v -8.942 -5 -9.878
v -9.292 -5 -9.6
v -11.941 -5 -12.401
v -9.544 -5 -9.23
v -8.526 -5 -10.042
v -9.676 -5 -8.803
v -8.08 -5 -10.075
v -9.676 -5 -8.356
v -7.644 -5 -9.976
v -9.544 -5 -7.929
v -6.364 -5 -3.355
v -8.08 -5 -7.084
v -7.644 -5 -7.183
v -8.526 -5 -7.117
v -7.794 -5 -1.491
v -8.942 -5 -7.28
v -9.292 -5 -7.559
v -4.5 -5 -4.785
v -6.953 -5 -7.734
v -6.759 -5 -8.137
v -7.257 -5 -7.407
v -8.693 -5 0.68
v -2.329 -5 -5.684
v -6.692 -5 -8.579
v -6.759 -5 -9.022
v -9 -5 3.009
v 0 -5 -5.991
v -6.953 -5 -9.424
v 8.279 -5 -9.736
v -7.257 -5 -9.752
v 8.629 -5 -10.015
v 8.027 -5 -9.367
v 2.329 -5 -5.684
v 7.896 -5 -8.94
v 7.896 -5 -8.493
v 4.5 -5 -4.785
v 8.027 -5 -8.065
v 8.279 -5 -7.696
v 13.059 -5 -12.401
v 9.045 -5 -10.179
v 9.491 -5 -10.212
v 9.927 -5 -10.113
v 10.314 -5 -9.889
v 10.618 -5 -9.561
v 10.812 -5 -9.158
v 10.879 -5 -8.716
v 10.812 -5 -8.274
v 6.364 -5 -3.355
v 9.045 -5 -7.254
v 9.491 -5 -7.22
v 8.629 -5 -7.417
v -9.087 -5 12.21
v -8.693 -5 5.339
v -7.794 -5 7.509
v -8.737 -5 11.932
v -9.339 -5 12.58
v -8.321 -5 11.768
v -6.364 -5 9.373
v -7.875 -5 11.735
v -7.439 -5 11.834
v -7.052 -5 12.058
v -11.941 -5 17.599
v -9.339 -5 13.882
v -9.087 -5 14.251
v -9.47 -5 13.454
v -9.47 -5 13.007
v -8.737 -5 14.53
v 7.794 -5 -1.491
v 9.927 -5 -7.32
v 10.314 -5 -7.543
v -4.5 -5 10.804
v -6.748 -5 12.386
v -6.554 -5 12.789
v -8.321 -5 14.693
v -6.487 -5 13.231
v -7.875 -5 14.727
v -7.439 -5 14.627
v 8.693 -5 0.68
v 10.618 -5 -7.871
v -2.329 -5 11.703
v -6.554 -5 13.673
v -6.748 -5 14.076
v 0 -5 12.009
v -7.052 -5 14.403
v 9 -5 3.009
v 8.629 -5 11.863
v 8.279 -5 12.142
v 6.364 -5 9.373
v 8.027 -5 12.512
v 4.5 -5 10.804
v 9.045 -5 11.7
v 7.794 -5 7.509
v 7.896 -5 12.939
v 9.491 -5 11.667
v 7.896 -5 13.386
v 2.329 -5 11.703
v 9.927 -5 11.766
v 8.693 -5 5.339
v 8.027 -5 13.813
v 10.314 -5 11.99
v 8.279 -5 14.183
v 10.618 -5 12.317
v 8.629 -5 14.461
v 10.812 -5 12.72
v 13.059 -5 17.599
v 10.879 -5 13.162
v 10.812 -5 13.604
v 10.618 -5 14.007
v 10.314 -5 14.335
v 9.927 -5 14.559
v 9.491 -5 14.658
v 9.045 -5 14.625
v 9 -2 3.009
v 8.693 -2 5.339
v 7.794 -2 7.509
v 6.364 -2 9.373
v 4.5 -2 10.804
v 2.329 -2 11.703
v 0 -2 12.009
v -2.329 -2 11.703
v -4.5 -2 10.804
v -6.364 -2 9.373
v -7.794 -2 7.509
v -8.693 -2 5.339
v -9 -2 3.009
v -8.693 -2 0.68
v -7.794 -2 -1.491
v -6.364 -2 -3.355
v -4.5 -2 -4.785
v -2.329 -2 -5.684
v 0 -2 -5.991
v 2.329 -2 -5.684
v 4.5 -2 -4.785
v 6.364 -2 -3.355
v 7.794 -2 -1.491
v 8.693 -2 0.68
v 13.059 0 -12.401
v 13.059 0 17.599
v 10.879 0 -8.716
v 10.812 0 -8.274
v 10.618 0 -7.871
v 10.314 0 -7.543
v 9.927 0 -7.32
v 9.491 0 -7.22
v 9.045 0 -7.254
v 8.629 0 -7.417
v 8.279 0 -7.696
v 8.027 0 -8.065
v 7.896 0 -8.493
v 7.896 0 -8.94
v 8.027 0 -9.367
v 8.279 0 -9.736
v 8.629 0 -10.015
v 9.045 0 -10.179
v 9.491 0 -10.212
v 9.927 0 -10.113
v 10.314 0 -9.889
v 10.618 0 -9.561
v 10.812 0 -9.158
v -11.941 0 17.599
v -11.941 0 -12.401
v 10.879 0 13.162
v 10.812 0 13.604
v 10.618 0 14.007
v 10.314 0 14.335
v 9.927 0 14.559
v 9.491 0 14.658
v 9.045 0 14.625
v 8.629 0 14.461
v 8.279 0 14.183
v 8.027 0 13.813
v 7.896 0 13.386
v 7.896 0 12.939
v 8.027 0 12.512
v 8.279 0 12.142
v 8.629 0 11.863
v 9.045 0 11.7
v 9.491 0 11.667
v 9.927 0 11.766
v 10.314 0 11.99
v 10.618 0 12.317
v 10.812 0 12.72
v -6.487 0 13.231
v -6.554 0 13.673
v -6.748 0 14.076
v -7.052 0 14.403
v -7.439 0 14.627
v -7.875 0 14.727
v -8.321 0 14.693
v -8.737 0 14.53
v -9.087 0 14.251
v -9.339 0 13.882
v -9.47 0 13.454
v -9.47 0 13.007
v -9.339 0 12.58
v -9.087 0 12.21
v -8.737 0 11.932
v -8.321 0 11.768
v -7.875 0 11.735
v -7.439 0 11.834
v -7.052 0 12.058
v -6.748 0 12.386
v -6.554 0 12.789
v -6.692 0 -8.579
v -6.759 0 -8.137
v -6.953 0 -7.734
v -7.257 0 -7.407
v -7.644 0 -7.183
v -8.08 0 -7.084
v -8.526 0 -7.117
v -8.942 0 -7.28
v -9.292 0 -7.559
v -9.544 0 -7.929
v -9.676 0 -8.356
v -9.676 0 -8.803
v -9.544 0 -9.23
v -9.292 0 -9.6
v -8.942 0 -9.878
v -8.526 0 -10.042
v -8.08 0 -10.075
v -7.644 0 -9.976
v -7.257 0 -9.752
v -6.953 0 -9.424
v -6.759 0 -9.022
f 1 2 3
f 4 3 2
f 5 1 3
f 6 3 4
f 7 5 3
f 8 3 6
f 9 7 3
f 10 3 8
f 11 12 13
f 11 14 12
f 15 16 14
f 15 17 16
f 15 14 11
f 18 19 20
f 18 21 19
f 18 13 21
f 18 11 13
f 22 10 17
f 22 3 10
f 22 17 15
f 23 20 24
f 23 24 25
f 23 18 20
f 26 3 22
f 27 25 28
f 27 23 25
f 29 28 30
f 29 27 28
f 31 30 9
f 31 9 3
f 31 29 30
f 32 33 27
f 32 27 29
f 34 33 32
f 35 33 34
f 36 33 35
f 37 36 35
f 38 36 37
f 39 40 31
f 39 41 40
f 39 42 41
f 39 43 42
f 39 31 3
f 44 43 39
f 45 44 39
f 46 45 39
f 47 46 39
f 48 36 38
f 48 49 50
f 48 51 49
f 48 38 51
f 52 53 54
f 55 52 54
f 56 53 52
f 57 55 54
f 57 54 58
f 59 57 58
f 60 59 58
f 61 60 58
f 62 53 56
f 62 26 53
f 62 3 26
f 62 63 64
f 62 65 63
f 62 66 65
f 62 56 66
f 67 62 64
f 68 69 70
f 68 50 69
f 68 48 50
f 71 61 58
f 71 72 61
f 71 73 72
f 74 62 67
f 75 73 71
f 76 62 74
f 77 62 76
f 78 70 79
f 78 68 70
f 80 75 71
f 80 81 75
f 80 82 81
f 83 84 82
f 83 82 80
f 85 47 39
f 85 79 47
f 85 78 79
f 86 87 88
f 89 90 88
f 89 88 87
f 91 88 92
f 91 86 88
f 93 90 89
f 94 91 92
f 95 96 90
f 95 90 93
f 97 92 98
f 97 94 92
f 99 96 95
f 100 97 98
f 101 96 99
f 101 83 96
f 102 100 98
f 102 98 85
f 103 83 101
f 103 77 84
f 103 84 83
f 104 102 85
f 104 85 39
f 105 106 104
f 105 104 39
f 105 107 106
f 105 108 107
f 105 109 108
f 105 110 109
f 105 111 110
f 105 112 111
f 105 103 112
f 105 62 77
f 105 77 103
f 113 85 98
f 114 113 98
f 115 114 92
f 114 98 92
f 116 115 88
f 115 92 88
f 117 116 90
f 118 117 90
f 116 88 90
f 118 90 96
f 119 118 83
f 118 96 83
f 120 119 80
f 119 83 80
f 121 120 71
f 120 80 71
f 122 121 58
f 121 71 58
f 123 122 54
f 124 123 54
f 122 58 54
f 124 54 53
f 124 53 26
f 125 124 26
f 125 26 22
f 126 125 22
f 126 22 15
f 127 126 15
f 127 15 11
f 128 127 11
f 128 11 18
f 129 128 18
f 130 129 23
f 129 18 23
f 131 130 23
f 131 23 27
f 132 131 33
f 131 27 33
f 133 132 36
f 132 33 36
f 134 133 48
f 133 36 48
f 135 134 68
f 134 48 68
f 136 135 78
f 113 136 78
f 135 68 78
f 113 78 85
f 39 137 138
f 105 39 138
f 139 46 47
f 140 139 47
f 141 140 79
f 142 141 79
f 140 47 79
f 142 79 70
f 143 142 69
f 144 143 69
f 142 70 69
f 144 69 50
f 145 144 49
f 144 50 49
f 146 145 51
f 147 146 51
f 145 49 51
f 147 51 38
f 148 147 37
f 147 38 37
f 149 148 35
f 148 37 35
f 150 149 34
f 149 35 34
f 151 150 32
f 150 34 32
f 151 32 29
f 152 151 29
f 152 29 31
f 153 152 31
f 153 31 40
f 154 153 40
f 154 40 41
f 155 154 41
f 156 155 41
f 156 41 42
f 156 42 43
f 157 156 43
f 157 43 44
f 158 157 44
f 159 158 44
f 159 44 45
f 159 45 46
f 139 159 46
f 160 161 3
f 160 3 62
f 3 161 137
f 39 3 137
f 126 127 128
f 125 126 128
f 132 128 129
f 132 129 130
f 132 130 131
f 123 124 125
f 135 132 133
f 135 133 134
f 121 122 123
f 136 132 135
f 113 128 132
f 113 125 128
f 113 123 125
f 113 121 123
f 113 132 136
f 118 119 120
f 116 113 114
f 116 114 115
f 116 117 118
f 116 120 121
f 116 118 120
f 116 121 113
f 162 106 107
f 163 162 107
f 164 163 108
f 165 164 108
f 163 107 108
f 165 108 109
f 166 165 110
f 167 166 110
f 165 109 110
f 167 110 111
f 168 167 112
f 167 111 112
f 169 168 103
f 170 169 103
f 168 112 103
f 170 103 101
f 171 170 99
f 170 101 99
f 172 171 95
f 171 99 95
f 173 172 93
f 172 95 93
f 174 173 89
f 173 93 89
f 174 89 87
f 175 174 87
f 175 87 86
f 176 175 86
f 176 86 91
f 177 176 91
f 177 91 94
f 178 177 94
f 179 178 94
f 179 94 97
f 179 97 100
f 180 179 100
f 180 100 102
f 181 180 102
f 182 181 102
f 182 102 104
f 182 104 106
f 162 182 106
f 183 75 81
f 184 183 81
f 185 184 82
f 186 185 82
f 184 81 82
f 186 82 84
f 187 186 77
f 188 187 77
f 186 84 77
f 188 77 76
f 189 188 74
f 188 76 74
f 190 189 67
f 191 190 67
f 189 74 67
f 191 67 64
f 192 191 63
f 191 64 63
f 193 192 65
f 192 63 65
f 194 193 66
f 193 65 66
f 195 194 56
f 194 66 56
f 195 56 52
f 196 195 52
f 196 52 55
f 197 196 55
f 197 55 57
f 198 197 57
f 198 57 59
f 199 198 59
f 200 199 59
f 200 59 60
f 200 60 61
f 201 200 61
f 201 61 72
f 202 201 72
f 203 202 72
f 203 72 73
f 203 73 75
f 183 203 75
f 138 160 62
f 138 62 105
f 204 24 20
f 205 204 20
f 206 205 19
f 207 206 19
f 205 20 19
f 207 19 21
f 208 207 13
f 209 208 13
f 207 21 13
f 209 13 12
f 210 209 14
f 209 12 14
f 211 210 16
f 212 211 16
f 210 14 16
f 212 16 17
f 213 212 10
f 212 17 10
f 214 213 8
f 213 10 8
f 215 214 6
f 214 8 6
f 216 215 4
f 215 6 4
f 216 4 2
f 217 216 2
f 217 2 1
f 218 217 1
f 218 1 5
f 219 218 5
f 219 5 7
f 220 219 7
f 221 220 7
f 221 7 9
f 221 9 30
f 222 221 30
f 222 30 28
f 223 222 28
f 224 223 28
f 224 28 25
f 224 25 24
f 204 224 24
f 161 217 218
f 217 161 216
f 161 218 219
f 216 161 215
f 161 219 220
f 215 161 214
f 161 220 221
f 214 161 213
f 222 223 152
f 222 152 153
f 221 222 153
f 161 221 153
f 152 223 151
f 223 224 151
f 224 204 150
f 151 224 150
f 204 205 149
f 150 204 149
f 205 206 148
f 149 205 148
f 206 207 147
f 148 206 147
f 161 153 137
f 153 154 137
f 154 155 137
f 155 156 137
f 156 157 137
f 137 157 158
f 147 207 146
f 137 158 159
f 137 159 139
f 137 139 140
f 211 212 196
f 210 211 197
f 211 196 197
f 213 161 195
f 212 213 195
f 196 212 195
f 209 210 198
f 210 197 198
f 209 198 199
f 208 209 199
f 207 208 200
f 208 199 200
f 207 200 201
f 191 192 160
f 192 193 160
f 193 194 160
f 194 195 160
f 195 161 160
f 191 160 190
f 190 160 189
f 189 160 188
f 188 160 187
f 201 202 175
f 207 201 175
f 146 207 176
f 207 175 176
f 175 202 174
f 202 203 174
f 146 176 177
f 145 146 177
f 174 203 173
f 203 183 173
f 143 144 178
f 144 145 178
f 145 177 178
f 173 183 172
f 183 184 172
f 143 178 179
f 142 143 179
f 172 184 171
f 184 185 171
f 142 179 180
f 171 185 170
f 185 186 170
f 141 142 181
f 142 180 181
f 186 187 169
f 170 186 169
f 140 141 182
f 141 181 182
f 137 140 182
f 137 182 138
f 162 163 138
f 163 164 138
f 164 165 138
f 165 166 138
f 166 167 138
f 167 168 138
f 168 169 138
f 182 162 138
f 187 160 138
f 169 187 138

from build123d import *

# Parameters (mm, degrees)
F0_W     = 25
F0_H     = 30
F1_DEPTH = 5
F2_R     = 1.5
F3_DEPTH = 25
F4_R     = 9
F5_DEPTH = 3


with BuildPart() as f1:
    # F0 (on Front) → F1 (new body)
    with BuildSketch(Plane.XZ):
        with Locations((0.55913, 2.599103)):
            Rectangle(F0_W, F0_H)
    extrude(amount=F1_DEPTH)

    # F2 (on face) → F3 (cut)
    with BuildSketch(Plane.XZ.offset(5)):
        with Locations((-7.987171, 13.230707)):
            Circle(F2_R)
        with Locations((9.378917, 13.162337)):
            Circle(F2_R)
        with Locations((-8.192283, -8.579459)):
            Circle(F2_R)
        with Locations((9.378917, -8.716201)):
            Circle(F2_R)
    extrude(amount=-F3_DEPTH, mode=Mode.SUBTRACT)

    # F4 (on face) → F5 (cut)
    with BuildSketch(Plane.XZ.offset(5)):
        with Locations((0, 3.009328)):
            Circle(F4_R)
    extrude(amount=-F5_DEPTH, mode=Mode.SUBTRACT)


solid = f1.part
